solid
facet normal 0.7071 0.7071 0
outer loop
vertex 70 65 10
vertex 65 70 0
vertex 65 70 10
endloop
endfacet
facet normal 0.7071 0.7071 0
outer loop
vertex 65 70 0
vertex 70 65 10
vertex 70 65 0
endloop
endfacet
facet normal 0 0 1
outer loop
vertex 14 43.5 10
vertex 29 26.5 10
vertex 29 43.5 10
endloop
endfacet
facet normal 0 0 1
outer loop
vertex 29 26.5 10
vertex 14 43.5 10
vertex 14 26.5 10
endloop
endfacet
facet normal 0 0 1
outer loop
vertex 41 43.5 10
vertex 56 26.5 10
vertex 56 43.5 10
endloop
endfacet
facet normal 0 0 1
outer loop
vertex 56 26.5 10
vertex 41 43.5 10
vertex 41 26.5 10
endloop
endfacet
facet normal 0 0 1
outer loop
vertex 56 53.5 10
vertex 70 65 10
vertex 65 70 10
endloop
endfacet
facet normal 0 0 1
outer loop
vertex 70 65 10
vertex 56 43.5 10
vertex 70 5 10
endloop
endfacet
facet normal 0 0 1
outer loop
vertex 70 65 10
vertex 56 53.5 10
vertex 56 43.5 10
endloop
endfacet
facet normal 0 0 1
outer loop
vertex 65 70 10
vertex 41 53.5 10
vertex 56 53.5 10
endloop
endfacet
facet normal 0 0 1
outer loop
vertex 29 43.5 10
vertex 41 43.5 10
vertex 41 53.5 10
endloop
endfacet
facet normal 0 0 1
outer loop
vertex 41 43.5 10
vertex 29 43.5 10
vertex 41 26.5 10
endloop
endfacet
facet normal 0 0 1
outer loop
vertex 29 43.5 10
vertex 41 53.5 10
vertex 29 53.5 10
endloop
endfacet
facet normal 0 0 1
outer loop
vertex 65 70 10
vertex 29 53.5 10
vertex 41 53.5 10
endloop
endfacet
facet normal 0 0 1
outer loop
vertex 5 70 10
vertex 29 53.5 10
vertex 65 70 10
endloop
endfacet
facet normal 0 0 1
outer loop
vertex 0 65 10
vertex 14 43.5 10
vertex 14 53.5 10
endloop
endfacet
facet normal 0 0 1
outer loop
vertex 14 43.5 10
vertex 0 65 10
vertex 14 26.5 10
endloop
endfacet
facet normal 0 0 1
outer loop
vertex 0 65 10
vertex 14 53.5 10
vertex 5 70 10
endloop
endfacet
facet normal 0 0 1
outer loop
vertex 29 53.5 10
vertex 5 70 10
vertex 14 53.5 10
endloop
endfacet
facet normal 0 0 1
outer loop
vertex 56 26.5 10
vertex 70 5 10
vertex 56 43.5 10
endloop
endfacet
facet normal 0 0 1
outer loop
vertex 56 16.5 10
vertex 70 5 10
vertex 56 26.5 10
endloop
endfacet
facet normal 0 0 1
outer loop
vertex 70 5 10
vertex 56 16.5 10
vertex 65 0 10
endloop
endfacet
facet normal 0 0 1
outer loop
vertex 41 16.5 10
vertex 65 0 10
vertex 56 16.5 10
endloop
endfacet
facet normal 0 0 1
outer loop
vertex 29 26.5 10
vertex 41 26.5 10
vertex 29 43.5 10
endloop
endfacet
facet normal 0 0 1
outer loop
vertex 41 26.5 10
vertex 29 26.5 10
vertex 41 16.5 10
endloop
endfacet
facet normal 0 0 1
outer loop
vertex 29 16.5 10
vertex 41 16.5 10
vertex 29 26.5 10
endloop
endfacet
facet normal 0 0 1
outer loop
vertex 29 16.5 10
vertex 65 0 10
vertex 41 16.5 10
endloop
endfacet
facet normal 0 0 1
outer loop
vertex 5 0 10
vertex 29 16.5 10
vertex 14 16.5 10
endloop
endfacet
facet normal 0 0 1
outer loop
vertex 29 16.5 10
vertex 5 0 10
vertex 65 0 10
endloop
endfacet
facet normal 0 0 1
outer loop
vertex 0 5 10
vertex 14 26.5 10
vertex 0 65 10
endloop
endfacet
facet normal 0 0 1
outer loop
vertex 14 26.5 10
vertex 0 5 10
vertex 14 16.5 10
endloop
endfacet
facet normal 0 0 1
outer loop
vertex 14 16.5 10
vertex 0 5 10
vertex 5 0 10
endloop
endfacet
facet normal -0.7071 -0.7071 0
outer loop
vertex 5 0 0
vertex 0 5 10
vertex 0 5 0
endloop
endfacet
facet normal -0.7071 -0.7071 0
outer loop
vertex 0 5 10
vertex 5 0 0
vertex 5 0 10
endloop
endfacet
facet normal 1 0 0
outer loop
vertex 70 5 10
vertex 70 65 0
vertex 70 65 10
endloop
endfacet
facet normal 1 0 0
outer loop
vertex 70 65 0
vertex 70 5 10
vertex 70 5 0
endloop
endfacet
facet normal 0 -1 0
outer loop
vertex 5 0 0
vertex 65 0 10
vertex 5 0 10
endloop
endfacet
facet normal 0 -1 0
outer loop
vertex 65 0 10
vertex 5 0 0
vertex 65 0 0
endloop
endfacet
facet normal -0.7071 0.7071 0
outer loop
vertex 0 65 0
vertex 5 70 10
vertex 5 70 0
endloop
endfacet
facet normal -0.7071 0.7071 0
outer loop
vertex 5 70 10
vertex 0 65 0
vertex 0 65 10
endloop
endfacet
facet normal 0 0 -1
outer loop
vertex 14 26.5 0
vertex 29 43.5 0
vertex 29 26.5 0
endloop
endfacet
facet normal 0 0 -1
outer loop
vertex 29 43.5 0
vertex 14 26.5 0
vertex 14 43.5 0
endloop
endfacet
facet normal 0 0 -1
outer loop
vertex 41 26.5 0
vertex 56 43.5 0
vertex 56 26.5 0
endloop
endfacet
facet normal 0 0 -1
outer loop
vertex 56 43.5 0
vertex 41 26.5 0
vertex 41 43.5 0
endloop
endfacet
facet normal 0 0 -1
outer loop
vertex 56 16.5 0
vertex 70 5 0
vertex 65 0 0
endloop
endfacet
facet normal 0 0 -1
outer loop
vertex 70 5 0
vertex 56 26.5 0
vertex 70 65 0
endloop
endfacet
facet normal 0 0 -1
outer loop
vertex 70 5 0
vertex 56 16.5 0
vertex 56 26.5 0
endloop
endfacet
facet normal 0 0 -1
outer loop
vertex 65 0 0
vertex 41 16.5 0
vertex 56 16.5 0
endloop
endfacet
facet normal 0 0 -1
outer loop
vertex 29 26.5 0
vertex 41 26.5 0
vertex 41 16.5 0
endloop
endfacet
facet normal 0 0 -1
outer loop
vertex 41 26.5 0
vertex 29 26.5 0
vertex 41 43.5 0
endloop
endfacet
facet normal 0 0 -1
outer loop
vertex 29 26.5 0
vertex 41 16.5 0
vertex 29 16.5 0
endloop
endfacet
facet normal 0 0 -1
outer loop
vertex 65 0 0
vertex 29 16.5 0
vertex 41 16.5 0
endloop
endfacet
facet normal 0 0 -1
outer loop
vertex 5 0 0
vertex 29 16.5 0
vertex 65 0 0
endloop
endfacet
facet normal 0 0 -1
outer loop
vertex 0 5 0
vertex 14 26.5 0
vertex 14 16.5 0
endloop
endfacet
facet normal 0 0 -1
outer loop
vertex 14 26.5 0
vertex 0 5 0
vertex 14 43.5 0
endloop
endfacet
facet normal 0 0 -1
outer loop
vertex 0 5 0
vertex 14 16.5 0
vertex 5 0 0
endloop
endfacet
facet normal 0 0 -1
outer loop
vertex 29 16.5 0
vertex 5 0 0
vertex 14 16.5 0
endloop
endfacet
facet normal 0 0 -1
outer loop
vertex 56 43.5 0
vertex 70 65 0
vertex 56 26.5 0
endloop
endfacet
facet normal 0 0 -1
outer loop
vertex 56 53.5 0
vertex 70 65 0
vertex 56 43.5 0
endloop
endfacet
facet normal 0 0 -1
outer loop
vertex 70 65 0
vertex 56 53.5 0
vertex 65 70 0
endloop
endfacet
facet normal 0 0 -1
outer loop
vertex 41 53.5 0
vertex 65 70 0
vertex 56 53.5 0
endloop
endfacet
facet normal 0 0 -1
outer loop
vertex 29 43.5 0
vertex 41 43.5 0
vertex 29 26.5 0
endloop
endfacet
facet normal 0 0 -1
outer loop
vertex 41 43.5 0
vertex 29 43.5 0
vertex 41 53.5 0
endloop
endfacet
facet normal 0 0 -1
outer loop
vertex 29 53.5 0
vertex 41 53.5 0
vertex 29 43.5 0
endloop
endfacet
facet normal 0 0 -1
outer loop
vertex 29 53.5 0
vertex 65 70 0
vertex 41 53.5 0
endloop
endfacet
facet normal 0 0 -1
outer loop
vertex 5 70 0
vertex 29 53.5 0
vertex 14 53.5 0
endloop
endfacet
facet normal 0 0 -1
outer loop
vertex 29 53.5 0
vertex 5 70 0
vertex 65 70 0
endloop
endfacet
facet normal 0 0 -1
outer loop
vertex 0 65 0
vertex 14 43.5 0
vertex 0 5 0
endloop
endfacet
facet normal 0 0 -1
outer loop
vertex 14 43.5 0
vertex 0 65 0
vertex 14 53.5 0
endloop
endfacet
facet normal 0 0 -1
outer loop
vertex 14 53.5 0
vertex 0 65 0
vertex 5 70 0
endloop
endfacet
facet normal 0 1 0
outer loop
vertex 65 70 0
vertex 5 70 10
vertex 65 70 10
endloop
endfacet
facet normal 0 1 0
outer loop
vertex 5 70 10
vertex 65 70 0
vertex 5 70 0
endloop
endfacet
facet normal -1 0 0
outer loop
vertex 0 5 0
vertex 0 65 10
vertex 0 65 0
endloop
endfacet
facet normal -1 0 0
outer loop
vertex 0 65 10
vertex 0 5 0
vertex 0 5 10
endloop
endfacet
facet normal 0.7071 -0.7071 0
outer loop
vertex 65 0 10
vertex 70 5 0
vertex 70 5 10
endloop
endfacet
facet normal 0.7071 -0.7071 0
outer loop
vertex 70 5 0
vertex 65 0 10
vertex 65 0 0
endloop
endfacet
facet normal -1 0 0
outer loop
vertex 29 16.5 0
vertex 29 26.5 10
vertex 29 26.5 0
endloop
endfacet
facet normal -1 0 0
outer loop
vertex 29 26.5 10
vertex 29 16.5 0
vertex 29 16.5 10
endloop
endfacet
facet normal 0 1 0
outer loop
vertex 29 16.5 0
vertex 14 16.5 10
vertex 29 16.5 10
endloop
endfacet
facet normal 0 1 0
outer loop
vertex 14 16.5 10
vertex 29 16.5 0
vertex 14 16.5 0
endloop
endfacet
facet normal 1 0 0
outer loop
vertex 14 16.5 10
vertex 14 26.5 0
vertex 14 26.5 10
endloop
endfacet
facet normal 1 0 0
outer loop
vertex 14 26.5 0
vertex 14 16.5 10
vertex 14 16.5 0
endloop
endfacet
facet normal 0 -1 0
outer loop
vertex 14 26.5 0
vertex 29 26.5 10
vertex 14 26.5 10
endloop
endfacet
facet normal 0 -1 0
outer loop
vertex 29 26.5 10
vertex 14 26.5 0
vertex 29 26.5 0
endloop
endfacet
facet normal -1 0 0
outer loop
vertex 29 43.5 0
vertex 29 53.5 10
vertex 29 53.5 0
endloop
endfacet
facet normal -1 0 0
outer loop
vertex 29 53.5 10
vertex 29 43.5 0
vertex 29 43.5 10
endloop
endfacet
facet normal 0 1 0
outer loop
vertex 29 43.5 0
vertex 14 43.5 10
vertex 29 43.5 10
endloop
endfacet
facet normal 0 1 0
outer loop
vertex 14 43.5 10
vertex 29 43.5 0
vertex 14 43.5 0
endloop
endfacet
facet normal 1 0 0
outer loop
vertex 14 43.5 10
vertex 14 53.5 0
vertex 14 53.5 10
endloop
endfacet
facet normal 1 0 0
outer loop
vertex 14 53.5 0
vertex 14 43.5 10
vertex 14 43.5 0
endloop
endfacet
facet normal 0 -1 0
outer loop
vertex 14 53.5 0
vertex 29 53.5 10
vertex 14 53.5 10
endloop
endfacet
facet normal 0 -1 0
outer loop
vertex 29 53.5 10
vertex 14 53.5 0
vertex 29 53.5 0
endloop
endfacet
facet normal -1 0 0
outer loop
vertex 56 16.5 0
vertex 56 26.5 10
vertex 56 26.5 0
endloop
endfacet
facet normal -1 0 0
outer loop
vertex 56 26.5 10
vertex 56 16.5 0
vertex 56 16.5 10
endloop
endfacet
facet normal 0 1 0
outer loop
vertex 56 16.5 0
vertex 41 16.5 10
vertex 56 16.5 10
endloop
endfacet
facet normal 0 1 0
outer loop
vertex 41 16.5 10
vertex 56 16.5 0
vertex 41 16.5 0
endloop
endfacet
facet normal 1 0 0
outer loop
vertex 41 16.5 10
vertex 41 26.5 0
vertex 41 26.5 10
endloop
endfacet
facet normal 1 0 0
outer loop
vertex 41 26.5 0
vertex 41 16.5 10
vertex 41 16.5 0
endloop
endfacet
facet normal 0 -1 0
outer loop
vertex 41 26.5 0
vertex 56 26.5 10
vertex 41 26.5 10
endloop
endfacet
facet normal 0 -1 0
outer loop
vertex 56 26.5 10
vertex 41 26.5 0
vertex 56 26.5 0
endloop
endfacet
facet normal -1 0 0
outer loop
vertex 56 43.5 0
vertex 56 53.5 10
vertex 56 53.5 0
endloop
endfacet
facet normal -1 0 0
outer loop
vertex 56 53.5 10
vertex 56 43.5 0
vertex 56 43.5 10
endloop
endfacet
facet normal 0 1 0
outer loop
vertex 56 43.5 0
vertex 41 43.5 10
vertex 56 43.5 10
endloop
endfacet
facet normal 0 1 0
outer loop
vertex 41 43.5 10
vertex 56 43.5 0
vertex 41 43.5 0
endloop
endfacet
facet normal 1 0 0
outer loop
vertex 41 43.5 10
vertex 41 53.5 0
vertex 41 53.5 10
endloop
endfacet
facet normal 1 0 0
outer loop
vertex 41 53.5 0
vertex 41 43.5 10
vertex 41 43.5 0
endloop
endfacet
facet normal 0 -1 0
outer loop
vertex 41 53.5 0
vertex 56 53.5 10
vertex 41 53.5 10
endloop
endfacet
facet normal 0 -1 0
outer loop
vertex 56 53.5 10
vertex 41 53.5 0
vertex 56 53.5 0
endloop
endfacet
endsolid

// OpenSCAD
$fn = 32;

// ----------------------------------------------------------------------
// Windowed plate: 4 voids, 70 x 70 x 10 mm
// ----------------------------------------------------------------------

// --- parameters (mm) ---
plate_l = 70;             // plate length, X
plate_w = 70;             // plate width, Y
plate_t = 10;             // plate thickness, Z
edge_margin = 8;          // wall from the plate edge to any window
win_l = 15;               // pocket length
win_w = 10;               // pocket width
pitch_x = 27;             // grid pitch along X
pitch_y = 27;             // grid pitch along Y
depth_1 = 10;             // depth of void 1 (full thickness = through)
depth_2 = 10;             // depth of void 2 (full thickness = through)
depth_3 = 10;             // depth of void 3 (full thickness = through)
depth_4 = 10;             // depth of void 4 (full thickness = through)
corner_c = 5;             // corner chamfer of the plate
fit_tol = 0.05;           // declared fit tolerance (prompt contract)
free_tol = 0.3;           // declared free tolerance (prompt contract)

profile = [[5, 0], [65, 0], [70, 5], [70, 65], [65, 70], [5, 70], [0, 65], [0, 5]];  // primary outline, 8 points, counter clockwise
void_1 = [[14, 16.5], [29, 16.5], [29, 26.5], [14, 26.5]];  // pocket at grid node 0,0, 4 points
void_2 = [[14, 43.5], [29, 43.5], [29, 53.5], [14, 53.5]];  // pocket at grid node 0,1, 4 points
void_3 = [[41, 16.5], [56, 16.5], [56, 26.5], [41, 26.5]];  // pocket at grid node 1,0, 4 points
void_4 = [[41, 43.5], [56, 43.5], [56, 53.5], [41, 53.5]];  // pocket at grid node 1,1, 4 points

// --- the one profile operation ---
difference() {
  linear_extrude(height = plate_t) polygon(points = profile);
  translate([0, 0, -1])
    linear_extrude(height = plate_t + 2) polygon(points = void_1);
  translate([0, 0, -1])
    linear_extrude(height = plate_t + 2) polygon(points = void_2);
  translate([0, 0, -1])
    linear_extrude(height = plate_t + 2) polygon(points = void_3);
  translate([0, 0, -1])
    linear_extrude(height = plate_t + 2) polygon(points = void_4);
}
